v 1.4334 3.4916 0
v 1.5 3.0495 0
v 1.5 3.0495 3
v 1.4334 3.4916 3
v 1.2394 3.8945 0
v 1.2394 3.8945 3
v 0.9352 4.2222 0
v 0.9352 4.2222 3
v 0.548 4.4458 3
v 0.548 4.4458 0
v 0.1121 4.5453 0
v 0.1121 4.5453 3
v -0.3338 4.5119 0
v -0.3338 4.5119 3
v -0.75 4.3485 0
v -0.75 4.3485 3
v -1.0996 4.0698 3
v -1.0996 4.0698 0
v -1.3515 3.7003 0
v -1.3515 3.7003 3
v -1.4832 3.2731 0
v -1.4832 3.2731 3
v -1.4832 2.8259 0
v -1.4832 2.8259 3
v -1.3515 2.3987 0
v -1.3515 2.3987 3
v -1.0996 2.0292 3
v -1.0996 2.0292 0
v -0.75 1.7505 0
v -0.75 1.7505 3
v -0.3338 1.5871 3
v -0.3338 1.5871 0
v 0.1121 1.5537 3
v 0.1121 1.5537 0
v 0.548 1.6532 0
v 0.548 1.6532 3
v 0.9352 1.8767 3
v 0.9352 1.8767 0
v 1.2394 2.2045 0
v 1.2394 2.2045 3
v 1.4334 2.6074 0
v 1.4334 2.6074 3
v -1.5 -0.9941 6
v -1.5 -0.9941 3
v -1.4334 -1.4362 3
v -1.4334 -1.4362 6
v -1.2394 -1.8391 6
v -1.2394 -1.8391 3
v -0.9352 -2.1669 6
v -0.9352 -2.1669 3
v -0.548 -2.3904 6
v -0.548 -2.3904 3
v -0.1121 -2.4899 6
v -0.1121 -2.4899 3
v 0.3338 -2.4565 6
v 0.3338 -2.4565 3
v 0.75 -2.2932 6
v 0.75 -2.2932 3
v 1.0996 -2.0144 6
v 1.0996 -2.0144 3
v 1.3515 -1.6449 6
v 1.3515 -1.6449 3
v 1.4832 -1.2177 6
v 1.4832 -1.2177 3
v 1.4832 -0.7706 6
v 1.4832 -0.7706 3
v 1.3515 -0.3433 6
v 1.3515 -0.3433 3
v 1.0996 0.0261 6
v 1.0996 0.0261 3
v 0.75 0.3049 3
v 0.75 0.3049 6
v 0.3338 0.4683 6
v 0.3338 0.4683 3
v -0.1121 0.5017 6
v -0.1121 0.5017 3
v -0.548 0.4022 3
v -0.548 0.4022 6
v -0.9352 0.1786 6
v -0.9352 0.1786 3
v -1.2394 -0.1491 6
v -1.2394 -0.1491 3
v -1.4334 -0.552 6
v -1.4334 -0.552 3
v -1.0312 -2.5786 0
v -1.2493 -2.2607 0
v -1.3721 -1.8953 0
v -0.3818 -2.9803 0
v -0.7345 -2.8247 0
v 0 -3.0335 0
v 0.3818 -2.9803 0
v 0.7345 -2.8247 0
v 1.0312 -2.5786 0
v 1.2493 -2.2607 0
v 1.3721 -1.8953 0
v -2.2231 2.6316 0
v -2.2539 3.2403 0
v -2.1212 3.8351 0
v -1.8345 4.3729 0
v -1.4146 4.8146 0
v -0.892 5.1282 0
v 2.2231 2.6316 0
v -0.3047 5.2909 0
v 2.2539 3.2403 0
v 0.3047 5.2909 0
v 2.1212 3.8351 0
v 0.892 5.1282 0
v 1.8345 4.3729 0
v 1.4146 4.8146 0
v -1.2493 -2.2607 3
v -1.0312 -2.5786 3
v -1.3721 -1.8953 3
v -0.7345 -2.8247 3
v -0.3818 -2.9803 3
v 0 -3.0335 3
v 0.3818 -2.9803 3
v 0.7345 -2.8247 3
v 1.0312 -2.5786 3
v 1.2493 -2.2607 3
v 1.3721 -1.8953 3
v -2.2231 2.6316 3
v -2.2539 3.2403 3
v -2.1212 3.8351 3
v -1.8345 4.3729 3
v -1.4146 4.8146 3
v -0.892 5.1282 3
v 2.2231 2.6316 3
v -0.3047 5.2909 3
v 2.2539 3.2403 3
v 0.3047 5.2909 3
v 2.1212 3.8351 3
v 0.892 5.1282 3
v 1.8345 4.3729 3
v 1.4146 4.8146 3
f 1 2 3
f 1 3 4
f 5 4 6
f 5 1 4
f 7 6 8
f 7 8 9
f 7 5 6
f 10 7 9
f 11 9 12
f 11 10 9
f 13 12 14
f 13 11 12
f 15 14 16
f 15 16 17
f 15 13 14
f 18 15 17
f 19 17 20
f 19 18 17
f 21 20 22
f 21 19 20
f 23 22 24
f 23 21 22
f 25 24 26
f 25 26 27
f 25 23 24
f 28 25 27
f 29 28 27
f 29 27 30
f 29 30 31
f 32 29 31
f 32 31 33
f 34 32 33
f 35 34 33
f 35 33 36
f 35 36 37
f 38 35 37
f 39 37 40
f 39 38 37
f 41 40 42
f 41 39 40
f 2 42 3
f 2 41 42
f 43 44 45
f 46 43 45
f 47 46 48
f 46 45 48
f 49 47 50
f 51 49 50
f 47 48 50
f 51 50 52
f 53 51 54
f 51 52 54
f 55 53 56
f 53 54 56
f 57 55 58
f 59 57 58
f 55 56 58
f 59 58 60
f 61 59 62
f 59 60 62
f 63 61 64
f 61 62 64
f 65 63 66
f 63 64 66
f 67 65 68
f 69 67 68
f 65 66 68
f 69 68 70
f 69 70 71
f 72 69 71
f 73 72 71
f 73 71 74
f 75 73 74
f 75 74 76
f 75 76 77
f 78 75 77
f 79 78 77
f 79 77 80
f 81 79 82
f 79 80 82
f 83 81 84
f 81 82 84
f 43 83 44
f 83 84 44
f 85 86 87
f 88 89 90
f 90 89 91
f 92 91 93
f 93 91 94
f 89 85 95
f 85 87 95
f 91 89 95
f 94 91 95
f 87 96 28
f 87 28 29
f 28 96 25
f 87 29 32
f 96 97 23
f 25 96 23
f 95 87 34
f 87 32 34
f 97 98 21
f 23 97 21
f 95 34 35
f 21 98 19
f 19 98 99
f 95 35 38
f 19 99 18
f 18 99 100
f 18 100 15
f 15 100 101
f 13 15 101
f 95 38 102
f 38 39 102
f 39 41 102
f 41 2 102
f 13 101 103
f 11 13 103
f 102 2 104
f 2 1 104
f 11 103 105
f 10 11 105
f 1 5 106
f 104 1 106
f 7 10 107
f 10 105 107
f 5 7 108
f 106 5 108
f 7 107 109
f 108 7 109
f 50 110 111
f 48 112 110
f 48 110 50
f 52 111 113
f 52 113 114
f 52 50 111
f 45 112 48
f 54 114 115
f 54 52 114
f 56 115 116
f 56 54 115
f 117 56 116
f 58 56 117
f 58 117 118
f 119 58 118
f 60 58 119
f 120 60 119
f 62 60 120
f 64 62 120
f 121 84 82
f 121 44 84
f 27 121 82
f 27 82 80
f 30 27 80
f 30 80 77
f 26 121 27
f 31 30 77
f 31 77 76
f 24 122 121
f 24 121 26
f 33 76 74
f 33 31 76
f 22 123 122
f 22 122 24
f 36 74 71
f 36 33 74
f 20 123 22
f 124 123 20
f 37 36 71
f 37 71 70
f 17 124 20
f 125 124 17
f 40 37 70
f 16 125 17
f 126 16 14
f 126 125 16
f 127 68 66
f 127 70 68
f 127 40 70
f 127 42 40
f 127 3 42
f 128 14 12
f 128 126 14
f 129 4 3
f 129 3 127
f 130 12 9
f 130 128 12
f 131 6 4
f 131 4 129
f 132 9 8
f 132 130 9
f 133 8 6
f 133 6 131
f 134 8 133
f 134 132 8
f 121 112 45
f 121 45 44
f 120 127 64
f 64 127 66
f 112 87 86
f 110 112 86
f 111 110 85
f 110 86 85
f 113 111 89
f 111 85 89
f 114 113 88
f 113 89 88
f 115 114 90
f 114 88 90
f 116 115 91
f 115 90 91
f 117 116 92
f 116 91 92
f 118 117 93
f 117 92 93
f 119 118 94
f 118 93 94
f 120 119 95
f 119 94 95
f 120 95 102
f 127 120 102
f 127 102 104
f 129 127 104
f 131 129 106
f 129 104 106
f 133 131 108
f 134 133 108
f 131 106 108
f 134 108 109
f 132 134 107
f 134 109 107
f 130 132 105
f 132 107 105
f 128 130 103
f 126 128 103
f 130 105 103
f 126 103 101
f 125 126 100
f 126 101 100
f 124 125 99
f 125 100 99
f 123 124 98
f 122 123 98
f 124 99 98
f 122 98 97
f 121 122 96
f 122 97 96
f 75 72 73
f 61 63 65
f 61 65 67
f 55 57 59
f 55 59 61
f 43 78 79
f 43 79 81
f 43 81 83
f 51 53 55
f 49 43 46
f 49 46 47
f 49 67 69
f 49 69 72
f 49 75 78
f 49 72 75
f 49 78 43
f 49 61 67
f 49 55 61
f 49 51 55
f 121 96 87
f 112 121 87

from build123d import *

# Parameters (mm, degrees)
SKETCH2_R           = 2.5
BOSS_EXTRUDE1_DEPTH = 5
SKETCH5_R           = 2.5
BOSS_EXTRUDE2_DEPTH = 5
SCALE1_SCALE        = 0.6


with BuildPart() as part:
    # Sketch2 → Boss-Extrude1 (new body)
    with BuildSketch(Plane.XY):
        with BuildLine():
            Line((-3.705099972, 4.386006173), (-2.28681669, -3.158891918))
            ThreePointArc((-2.28681669, -3.158891918), (0, -5.055887715), (2.28681669, -3.158891918))
            Line((2.28681669, -3.158891918), (3.705099972, 4.386006173))
            ThreePointArc((3.705099972, 4.386006173), (0, 8.852481252), (-3.705099972, 4.386006173))
        make_face()
        with Locations((0, 5.082487595)):
            Circle(SKETCH2_R, mode=Mode.SUBTRACT)
    extrude(amount=BOSS_EXTRUDE1_DEPTH)

    # Sketch5 → Boss-Extrude2 (add)
    with BuildSketch(Plane.XY.offset(5)):
        with Locations(Location((0, -1.656861976, 0), (0, 0, 180))):
            Circle(SKETCH5_R)
    extrude(amount=BOSS_EXTRUDE2_DEPTH)


with BuildPart() as part_1:
    # Scale1: scaled about (0, 0, 0)
    add(part.part.scale(SCALE1_SCALE))


solid = part_1.part
